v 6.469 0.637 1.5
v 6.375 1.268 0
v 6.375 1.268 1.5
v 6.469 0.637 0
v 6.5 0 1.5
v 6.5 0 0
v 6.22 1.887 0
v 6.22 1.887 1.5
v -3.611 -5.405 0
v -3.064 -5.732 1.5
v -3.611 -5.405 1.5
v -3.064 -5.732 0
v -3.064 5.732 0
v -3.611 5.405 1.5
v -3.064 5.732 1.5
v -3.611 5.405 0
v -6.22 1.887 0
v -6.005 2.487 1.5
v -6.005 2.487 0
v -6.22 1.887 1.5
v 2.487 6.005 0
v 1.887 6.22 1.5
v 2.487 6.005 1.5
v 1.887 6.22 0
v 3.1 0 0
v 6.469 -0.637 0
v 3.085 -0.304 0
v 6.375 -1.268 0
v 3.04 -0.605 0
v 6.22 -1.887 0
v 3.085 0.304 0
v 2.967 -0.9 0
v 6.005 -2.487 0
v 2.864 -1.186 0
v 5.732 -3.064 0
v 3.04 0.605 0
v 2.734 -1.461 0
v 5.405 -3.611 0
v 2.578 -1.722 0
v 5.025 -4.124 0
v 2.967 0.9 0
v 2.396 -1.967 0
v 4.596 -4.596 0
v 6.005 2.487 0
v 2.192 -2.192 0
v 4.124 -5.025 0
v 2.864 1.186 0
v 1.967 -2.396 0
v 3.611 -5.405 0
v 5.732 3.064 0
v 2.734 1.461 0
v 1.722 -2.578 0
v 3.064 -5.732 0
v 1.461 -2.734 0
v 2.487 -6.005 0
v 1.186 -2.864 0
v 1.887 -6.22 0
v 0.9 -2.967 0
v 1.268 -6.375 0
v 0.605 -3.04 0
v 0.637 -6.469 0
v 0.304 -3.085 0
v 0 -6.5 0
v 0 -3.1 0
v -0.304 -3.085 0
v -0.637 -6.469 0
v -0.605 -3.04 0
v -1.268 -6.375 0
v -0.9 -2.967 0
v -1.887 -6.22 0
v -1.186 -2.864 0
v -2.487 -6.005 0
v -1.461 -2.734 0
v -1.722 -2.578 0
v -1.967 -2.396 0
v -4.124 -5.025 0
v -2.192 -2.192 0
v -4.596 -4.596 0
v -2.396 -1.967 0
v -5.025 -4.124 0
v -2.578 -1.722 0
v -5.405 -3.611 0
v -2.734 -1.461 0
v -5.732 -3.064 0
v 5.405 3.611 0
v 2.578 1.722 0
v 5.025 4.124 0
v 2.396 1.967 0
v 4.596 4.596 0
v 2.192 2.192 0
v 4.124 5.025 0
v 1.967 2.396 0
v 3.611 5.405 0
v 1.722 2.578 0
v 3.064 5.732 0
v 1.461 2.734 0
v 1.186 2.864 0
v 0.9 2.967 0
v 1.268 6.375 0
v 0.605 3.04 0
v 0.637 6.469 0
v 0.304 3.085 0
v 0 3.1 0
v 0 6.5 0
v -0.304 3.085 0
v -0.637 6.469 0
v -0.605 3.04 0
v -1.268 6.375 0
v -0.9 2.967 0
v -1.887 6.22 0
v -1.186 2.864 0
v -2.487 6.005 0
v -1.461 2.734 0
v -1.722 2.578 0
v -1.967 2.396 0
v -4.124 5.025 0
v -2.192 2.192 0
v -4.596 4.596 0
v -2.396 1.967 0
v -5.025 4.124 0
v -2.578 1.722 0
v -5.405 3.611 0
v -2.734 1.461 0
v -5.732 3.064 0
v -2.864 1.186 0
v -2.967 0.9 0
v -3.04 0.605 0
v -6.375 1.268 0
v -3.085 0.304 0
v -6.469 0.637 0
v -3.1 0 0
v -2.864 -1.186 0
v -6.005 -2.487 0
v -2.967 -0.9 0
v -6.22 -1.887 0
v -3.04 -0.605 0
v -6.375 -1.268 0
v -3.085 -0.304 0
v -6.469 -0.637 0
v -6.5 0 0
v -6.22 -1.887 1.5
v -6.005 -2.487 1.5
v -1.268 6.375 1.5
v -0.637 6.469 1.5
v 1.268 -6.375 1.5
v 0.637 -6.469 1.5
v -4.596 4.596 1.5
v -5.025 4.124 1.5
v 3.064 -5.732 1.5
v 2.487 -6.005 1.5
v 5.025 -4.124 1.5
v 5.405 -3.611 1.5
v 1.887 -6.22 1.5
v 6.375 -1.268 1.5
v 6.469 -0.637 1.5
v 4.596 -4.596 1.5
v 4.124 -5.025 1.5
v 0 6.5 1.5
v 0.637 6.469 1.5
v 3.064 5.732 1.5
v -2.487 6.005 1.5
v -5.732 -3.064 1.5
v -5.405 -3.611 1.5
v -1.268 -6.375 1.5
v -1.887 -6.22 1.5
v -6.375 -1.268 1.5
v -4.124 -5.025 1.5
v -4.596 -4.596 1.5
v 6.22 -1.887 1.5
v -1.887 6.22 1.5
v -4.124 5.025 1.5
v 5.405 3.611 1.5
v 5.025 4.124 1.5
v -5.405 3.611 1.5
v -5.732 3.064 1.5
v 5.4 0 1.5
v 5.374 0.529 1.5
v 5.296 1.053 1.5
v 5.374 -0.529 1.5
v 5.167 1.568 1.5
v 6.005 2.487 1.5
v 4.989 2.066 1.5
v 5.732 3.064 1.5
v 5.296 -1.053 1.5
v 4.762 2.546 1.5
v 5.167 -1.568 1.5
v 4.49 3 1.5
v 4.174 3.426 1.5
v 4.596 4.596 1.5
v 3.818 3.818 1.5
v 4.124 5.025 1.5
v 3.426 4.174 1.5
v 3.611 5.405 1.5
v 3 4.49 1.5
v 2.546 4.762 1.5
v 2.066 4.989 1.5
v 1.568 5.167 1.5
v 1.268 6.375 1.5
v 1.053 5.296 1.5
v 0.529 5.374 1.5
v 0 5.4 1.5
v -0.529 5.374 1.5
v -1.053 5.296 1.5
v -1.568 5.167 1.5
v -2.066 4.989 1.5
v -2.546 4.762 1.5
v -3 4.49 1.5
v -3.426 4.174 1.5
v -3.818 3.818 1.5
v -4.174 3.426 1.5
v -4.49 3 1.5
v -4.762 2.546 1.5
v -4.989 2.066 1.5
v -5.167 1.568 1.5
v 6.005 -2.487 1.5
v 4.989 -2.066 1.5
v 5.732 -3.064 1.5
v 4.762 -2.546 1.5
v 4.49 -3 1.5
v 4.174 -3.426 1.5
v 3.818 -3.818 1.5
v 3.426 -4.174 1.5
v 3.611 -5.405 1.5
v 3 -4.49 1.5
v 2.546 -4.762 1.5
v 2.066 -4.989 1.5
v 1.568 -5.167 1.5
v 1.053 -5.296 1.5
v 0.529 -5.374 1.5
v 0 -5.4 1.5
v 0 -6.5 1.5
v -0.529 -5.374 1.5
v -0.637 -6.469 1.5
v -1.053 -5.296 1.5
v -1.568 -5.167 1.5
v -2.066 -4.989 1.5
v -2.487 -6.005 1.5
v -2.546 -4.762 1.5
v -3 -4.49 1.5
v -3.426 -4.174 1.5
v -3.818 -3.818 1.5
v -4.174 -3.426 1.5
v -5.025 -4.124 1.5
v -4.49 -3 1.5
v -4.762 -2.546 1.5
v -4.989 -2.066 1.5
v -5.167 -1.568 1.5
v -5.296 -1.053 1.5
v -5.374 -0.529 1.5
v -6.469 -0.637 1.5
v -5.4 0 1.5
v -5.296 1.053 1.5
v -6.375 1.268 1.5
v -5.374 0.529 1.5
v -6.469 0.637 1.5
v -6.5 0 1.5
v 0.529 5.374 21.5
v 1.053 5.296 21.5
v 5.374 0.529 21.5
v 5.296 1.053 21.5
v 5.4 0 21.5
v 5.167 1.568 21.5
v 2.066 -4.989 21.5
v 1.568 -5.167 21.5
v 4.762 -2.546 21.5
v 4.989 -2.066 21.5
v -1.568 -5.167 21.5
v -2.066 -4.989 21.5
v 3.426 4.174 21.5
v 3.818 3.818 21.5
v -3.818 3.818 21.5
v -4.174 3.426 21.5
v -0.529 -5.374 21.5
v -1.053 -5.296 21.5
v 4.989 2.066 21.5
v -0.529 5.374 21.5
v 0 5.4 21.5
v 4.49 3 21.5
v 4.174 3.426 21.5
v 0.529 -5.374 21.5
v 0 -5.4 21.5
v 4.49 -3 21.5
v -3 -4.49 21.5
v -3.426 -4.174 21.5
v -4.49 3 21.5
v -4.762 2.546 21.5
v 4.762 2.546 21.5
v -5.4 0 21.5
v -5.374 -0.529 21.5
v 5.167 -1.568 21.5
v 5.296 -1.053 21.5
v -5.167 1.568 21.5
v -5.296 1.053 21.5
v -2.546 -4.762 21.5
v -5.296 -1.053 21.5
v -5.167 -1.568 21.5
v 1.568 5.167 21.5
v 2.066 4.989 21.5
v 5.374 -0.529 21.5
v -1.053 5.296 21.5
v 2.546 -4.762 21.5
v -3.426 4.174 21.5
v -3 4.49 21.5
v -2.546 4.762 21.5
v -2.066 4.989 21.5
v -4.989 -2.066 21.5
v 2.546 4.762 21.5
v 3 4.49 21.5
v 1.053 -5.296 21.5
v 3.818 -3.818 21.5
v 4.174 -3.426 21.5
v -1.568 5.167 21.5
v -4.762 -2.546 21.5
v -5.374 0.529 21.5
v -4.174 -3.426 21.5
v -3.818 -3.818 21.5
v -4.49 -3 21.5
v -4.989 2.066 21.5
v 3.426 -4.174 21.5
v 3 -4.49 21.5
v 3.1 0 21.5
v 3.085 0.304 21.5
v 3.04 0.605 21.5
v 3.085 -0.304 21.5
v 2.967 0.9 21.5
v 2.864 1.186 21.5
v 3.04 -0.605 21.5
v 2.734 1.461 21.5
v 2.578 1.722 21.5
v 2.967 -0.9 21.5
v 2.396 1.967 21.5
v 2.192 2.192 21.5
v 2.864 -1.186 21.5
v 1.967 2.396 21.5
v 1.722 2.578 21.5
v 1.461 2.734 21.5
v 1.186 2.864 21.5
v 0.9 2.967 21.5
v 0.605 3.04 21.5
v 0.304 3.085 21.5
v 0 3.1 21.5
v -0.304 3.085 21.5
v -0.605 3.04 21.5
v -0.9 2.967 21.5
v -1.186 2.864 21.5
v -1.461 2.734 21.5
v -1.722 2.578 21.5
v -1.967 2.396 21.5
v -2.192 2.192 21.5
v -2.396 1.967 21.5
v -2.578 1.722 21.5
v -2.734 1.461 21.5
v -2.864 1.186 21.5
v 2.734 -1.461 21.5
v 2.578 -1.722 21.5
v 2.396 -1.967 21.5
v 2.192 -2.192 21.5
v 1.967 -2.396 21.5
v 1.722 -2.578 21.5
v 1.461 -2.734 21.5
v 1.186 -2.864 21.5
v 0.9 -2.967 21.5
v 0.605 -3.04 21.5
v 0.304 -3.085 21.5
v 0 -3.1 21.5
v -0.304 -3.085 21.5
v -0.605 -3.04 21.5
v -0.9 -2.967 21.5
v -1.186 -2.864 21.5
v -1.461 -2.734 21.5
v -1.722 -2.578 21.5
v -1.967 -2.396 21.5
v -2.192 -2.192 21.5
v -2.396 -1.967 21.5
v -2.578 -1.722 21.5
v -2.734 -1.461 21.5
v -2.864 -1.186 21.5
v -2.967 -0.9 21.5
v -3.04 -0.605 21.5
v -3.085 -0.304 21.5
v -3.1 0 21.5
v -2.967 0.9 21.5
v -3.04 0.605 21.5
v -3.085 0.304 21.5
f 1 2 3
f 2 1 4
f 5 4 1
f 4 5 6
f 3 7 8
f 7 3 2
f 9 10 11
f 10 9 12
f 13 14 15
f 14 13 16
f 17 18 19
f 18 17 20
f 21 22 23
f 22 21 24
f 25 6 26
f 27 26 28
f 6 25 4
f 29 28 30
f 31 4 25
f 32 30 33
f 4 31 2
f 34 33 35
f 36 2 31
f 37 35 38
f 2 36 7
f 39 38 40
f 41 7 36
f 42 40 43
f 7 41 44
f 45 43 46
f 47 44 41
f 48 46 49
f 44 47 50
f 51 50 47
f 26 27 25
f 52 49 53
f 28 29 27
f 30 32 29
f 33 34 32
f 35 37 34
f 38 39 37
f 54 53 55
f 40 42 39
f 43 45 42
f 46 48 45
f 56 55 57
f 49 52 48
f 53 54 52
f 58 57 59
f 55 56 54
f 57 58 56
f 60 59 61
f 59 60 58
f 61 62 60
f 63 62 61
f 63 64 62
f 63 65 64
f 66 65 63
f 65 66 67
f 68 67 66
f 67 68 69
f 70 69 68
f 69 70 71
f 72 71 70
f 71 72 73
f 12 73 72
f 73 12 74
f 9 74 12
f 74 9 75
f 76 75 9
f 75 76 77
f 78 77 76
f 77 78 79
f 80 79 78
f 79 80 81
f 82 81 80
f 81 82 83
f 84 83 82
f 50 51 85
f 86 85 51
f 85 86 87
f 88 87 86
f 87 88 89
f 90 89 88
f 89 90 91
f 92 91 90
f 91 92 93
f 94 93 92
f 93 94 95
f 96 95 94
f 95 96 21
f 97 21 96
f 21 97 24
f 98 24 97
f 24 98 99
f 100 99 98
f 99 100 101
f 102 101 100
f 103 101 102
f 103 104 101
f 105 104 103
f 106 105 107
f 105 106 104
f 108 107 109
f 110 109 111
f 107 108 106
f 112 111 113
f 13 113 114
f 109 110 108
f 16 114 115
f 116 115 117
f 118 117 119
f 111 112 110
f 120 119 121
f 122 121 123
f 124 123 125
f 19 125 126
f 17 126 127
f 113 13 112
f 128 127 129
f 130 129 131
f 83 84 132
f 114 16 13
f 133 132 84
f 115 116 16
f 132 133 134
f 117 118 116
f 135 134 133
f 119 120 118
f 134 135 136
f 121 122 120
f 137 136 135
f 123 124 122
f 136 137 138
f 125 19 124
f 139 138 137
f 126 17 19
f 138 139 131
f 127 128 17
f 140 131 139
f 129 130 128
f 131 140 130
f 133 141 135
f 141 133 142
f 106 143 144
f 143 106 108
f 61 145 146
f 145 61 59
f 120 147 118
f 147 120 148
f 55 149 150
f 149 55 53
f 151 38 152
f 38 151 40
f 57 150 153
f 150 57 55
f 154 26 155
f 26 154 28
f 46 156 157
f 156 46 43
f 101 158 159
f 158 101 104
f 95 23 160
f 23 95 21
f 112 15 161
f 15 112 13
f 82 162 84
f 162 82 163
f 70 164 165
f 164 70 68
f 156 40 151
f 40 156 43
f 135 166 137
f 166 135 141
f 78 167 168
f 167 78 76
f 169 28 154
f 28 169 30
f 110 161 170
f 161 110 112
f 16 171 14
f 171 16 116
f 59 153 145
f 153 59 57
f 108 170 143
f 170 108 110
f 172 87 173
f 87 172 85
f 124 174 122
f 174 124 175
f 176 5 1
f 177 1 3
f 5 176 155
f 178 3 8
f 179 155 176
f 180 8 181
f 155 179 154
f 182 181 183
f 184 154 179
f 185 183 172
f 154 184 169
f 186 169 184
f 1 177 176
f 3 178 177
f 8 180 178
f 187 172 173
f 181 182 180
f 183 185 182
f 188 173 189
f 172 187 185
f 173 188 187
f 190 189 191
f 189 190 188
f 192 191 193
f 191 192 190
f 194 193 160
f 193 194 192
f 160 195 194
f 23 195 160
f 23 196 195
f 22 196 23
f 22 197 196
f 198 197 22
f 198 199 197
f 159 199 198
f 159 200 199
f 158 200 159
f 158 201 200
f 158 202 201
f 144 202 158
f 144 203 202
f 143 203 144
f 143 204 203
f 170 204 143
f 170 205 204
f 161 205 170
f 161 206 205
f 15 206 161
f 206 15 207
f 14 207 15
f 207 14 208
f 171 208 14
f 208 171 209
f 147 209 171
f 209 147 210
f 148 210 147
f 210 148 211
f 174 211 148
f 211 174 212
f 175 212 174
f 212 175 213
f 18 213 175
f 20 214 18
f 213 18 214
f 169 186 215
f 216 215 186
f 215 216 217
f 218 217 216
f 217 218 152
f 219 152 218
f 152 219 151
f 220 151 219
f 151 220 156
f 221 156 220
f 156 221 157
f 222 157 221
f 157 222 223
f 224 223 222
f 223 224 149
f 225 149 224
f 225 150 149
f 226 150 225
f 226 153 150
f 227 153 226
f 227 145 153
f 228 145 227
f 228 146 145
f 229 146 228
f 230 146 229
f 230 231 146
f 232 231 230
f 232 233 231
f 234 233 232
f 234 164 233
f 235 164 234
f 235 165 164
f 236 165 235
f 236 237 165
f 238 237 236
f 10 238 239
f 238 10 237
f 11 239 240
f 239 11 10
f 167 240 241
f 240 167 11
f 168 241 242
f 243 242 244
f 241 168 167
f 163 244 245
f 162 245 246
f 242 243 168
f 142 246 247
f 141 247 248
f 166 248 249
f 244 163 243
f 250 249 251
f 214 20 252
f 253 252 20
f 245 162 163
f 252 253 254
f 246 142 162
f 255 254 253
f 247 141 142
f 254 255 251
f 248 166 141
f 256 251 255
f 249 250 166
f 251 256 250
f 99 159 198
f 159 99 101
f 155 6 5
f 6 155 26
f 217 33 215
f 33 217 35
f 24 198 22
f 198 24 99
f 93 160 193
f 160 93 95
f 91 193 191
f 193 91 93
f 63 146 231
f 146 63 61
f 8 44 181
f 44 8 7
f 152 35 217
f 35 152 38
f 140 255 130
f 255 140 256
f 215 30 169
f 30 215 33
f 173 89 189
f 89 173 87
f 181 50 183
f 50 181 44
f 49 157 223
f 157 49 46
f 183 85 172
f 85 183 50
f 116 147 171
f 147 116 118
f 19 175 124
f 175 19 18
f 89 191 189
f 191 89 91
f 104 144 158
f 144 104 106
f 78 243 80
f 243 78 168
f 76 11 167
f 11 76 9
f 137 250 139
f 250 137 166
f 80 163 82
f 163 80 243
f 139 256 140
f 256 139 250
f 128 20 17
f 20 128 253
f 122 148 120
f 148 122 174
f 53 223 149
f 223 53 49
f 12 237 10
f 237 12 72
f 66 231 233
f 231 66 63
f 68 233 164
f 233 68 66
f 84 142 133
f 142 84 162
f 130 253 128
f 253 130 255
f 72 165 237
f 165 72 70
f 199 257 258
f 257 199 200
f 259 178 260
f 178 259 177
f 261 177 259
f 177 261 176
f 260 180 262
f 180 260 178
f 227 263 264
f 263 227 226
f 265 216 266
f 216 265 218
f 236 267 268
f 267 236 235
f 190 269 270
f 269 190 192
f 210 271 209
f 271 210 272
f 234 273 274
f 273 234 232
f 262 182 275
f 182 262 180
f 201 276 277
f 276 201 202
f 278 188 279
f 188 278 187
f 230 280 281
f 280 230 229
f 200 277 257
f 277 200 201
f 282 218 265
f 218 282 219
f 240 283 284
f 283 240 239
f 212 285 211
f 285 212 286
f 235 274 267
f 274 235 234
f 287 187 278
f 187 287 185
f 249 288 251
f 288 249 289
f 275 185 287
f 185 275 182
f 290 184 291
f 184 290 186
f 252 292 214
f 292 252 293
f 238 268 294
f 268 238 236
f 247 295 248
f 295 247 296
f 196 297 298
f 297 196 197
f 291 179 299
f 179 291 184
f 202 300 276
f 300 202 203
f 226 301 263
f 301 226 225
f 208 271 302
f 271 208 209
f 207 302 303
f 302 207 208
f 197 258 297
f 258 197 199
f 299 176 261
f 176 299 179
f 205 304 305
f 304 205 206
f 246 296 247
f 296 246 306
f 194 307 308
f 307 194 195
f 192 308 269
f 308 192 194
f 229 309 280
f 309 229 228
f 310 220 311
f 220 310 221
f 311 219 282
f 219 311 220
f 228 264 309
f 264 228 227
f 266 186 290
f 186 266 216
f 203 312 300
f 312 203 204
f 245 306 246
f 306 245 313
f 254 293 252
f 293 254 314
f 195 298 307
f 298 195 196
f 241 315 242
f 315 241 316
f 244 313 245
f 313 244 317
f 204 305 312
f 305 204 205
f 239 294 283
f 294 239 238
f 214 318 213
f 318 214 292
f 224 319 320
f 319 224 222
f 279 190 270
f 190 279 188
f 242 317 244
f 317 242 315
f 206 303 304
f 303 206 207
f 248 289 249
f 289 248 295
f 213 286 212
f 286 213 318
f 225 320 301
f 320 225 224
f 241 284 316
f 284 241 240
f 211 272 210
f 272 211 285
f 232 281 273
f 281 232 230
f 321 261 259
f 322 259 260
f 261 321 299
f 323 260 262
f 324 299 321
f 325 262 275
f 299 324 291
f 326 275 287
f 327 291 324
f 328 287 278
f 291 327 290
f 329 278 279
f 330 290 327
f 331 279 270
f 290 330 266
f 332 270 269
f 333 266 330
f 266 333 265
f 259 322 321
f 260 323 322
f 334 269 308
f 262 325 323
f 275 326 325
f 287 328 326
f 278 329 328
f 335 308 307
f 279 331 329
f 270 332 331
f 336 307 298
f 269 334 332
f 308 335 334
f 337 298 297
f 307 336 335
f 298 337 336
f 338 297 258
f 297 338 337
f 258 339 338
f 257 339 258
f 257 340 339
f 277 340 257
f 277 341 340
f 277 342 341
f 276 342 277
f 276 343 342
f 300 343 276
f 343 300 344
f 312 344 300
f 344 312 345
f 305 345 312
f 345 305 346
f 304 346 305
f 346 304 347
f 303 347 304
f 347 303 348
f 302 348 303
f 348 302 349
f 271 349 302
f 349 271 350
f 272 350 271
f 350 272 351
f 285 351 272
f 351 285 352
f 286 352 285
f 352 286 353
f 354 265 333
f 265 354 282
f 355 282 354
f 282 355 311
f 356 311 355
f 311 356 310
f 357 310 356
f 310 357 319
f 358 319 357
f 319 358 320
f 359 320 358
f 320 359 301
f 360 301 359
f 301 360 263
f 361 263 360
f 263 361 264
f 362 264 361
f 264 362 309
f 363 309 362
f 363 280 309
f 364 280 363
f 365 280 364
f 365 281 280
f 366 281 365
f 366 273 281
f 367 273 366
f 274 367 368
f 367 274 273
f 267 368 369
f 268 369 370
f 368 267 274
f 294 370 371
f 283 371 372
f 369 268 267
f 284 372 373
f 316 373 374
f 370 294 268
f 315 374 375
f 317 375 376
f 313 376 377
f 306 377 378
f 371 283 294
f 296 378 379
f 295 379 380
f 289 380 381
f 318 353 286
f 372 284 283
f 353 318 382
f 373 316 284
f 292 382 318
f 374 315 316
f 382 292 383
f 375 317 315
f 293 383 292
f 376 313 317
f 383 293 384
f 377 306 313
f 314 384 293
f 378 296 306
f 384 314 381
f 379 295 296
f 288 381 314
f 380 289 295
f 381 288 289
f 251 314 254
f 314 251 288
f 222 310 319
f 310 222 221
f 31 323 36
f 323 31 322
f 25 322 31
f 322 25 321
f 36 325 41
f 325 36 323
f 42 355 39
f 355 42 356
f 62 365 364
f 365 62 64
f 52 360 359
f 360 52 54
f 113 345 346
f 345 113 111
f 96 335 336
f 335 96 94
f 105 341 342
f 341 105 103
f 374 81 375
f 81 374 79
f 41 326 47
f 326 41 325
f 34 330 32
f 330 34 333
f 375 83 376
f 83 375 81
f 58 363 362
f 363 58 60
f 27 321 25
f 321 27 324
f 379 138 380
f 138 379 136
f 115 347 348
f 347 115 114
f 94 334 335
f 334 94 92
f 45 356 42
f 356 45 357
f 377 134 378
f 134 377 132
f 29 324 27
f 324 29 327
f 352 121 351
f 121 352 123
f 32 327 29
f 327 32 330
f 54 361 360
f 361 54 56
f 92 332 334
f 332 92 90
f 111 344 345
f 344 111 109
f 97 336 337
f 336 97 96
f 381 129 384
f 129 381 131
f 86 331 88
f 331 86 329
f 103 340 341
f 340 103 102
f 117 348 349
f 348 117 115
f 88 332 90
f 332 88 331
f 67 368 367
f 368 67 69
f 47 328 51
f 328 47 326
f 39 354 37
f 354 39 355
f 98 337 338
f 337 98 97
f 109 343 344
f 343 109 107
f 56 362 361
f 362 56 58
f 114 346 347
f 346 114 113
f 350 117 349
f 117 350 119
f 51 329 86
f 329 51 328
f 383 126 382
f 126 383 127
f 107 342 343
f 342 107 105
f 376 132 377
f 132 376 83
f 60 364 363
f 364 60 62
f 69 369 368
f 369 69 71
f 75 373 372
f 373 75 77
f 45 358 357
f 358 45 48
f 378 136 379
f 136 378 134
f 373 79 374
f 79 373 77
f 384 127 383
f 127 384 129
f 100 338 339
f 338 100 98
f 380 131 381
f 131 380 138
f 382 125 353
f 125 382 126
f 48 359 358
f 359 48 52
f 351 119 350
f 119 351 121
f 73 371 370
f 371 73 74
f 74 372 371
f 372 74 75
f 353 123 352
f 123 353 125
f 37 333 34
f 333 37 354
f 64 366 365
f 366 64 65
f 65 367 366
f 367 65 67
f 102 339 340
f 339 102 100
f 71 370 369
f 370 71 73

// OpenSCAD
// Adapter sleeve - a collar with a tube sleeve below, boring through, to adapt a smaller tube
// (e.g. 0.2 mL PCR) to a rack hole for a larger tube (e.g. 1.5 mL). NOVEL general part.
//

top_d     = 13;
wall      = 2.9;
sleeve_d  = 10.8;
length    = 21.5;
bore      = 6.2;

$fn = 64;

collar_h = 1.5;

difference() {
    union() {
        cylinder(h = collar_h, d = top_d);
        cylinder(h = length, d = sleeve_d);
    }
    translate([0, 0, -1]) cylinder(h = length + 2, d = bore);
}
